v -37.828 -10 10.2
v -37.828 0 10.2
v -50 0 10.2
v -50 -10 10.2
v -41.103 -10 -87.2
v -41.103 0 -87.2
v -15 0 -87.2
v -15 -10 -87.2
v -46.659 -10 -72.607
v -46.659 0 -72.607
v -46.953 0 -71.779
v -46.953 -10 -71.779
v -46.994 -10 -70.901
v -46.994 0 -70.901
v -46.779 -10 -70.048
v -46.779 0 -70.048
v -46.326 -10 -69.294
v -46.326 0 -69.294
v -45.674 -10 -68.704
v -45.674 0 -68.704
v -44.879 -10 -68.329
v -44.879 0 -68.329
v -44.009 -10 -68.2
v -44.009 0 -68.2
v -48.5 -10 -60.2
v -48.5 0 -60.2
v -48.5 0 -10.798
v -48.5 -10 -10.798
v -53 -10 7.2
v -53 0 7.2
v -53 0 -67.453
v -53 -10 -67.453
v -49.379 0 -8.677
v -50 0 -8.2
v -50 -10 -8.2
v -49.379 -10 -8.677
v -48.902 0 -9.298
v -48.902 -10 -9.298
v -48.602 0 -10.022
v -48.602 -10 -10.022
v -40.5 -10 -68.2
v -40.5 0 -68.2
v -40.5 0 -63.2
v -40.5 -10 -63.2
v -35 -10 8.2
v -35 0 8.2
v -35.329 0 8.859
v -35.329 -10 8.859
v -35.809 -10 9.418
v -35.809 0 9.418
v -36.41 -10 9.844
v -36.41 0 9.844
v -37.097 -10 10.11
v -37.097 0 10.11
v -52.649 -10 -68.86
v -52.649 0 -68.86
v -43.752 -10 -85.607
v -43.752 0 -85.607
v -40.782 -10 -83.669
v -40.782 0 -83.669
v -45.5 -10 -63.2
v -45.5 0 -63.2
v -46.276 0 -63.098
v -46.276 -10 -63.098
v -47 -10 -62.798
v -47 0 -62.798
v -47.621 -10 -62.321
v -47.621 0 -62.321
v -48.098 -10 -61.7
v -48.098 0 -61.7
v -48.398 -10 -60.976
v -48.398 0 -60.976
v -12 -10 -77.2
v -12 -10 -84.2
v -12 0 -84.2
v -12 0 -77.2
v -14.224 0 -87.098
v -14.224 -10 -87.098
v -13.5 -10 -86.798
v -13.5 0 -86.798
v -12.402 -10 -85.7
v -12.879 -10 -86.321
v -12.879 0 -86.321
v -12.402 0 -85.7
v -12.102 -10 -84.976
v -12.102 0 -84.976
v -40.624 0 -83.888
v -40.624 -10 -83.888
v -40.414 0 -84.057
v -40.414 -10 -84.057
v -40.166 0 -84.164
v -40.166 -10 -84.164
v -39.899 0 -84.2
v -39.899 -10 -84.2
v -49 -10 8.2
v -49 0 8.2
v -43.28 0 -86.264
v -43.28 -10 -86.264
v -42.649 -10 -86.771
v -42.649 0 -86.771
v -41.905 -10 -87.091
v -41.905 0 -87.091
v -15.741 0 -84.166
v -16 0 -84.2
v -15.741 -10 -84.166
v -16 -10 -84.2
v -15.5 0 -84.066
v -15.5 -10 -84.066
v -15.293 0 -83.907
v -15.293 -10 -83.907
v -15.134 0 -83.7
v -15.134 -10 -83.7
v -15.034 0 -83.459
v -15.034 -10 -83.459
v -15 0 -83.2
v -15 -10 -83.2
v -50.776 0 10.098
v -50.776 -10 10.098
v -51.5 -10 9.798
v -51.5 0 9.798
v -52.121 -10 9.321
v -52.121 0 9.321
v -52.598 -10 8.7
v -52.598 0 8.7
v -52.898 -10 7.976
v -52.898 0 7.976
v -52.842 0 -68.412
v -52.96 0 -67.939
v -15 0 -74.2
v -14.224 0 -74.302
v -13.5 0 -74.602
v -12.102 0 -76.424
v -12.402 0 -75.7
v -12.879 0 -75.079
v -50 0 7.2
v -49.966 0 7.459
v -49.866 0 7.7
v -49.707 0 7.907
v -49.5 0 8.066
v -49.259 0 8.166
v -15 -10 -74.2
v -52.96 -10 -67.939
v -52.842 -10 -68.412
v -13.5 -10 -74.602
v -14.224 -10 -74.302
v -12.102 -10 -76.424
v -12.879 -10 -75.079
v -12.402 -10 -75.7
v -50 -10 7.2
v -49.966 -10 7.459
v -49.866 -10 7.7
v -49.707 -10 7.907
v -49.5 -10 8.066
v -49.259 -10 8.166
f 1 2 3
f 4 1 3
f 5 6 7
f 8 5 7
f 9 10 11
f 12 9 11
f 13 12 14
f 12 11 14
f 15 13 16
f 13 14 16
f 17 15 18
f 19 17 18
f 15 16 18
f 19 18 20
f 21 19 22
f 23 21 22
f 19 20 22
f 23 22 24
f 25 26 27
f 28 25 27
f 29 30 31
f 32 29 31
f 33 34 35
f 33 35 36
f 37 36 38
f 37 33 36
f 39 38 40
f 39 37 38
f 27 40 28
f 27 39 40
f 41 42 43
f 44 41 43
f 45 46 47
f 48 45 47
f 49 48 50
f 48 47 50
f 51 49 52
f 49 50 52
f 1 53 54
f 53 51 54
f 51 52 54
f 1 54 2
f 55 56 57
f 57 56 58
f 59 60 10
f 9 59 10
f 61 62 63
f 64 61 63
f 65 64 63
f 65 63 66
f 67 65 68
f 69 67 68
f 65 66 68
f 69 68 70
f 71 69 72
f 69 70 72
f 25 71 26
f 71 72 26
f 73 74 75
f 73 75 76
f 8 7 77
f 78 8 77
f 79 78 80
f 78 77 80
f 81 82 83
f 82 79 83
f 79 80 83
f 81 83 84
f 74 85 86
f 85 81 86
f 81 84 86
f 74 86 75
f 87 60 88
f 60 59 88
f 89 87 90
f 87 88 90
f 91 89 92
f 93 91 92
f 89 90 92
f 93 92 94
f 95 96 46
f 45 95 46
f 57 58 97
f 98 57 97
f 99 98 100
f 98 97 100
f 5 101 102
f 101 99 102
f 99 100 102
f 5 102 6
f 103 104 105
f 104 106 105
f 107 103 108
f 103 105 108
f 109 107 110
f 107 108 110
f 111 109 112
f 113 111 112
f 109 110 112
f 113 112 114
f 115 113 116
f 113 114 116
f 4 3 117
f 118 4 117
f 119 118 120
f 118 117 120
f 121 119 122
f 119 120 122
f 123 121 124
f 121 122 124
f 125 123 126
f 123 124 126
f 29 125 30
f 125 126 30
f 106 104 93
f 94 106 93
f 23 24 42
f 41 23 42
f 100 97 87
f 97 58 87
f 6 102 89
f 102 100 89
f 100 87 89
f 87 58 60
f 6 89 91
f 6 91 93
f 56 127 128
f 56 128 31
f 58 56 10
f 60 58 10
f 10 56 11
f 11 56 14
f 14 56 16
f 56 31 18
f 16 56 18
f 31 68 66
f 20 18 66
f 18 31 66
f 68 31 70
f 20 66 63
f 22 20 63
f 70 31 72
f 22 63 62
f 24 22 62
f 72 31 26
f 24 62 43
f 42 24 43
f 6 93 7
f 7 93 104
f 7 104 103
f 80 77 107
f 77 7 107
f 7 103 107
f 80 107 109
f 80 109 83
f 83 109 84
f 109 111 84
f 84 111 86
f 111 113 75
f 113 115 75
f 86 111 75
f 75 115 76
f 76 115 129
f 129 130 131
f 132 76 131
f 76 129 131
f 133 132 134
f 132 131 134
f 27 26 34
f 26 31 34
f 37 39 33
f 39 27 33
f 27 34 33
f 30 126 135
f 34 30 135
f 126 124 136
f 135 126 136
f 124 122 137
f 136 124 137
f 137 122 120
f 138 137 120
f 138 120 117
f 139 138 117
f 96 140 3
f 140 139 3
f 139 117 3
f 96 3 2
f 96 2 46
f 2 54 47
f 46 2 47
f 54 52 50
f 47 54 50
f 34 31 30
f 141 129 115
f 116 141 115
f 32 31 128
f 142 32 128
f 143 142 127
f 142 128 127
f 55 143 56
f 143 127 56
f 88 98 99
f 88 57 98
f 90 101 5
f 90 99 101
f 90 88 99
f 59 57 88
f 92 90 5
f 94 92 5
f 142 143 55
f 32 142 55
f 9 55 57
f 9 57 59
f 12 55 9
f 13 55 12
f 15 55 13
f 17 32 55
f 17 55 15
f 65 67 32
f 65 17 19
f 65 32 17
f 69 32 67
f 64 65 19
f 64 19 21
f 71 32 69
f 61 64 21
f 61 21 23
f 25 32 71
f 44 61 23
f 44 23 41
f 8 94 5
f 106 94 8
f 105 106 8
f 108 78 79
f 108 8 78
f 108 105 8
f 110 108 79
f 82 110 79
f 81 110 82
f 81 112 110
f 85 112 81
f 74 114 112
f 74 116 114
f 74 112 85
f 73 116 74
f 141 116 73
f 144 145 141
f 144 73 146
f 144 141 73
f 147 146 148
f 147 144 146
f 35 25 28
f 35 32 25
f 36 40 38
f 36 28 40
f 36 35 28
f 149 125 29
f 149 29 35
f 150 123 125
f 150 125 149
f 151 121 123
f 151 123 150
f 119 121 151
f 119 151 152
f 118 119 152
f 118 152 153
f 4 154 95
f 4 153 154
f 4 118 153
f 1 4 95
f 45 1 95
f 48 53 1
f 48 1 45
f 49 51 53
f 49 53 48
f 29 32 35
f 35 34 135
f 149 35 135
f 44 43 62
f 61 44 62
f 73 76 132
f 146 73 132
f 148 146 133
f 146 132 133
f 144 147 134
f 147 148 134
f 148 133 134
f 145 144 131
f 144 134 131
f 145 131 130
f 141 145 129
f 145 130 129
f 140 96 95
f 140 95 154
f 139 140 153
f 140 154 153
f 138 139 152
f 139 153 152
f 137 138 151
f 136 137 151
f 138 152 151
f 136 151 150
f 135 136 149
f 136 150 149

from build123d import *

# Parameters (mm, degrees)
F1_DEPTH    = 10
F2_T1_DEPTH = 25
F2_T3_DEPTH = 24.1421356237
F2_T5_DEPTH = 19.0165664987
F2_T7_DEPTH = 13.7370663506
F3_R        = 1
F4_T1_DEPTH = 10
F4_T3_DEPTH = 10
F4_T5_DEPTH = 22.9903810568


# Not quite as in the source:
# - a fillet or chamfer that OpenCascade refuses, or shapes differently, is made with other operations: its cross-section is extruded or revolved along the edge and cut away or added
# - a feature names something its author has since deleted; it is built from what else it names


with BuildPart() as f1:
    # F0 (on Front) → F1 (new body)
    with BuildSketch(Plane.XZ):
        Polygon((-50, 8.2), (-35, 8.2), (-35, 10.2), (-53, 10.2), (-53, -68.2), (-49, -68.2), (-49, -63.2), (-48.5, -63.2), (-48.5, -8.2), (-50, -8.2), align=None)
        Polygon((-49, -68.2), (-53, -68.2), (-44.5, -84.2), (-40.5, -84.2), align=None)
        Polygon((-12, -74.2), (-15, -74.2), (-15, -84.2), (-40.5, -84.2), (-44.5, -84.2), (-42.90625, -87.2), (-12, -87.2), align=None)
        Polygon((-40.5, -68.2), (-40.5, -63.2), (-48.5, -63.2), (-49, -63.2), (-49, -68.2), align=None)
    extrude(amount=F1_DEPTH)

    # F2: fillet of radius 3 on 6 edges, made by hand

    # F2_s2 → F2_t1 (cut)
    with BuildSketch(Plane.XZ.offset(-7.5)):
        with BuildLine():
            ThreePointArc((-50, 10.2), (-52.1213203436, 9.3213203436), (-53, 7.2))
            Line((-53, 7.2), (-53, 10.2))
            Line((-53, 10.2), (-50, 10.2))
        make_face()
        with BuildLine():
            ThreePointArc((-12, -77.2), (-12.8786796564, -75.0786796564), (-15, -74.2))
            Line((-15, -74.2), (-12, -74.2))
            Line((-12, -74.2), (-12, -77.2))
        make_face()
        with BuildLine():
            ThreePointArc((-15, -87.2), (-12.8786796564, -86.3213203436), (-12, -84.2))
            Line((-12, -84.2), (-12, -87.2))
            Line((-12, -87.2), (-15, -87.2))
        make_face()
    extrude(amount=F2_T1_DEPTH, mode=Mode.SUBTRACT)

    # F2_s4 → F2_t3 (cut)
    with BuildSketch(Plane.XZ.offset(-7.0710678119)):
        with BuildLine():
            ThreePointArc((-35, 8.2), (-36.0963763172, 9.6494897428), (-37.8284271247, 10.2))
            Line((-37.8284271247, 10.2), (-35, 10.2))
            Line((-35, 10.2), (-35, 8.2))
        make_face()
    extrude(amount=F2_T3_DEPTH, mode=Mode.SUBTRACT)

    # F2_s6 → F2_t5 (cut)
    with BuildSketch(Plane.XZ.offset(-4.5082832494)):
        with BuildLine():
            ThreePointArc((-43.7522838586, -85.6074656779), (-42.648511507, -86.7712251004), (-41.1029367003, -87.2))
            Line((-41.1029367003, -87.2), (-42.90625, -87.2))
            Line((-42.90625, -87.2), (-43.7522838586, -85.6074656779))
        make_face()
    extrude(amount=F2_T5_DEPTH, mode=Mode.SUBTRACT)

    # F2_s8 → F2_t7 (cut)
    with BuildSketch(Plane.XZ.offset(-1.8685331753)):
        with BuildLine():
            ThreePointArc((-53, -67.4525867299), (-52.9110171311, -68.1778310077), (-52.6493471584, -68.8600524078))
            Line((-52.6493471584, -68.8600524078), (-53, -68.2))
            Line((-53, -68.2), (-53, -67.4525867299))
        make_face()
    extrude(amount=F2_T7_DEPTH, mode=Mode.SUBTRACT)

    # F3
    f3_edges = [f1.edges().sort_by_distance(p)[0] for p in [
        (-40.5, -5, -84.2),
        (-15, -5, -84.2),
        (-50, -5, 8.2),
    ]]
    fillet(f3_edges, radius=F3_R)

    # F4: fillet of radius 3 on 3 edges, made by hand

    # F4_s2 → F4_t1 (join)
    with BuildSketch(Plane.XZ):
        with BuildLine():
            ThreePointArc((-46.6585338586, -72.6074656779), (-46.5804118006, -69.6544251933), (-44.0091867003, -68.2))
            Line((-44.0091867003, -68.2), (-49, -68.2))
            Line((-49, -68.2), (-46.6585338586, -72.6074656779))
        make_face()
    extrude(amount=F4_T1_DEPTH)

    # F4_s4 → F4_t3 (join)
    with BuildSketch(Plane.XZ):
        with BuildLine():
            ThreePointArc((-45.5, -63.2), (-47.6213203436, -62.3213203436), (-48.5, -60.2))
            Line((-48.5, -60.2), (-48.5, -63.2))
            Line((-48.5, -63.2), (-45.5, -63.2))
        make_face()
    extrude(amount=F4_T3_DEPTH)

    # F4_s6 → F4_t5 (cut)
    with BuildSketch(Plane.XZ.offset(-6.4951905284)):
        with BuildLine():
            ThreePointArc((-50, -8.2), (-48.9019237886, -9.2980762114), (-48.5, -10.7980762114))
            Line((-48.5, -10.7980762114), (-48.5, -8.2))
            Line((-48.5, -8.2), (-50, -8.2))
        make_face()
    extrude(amount=F4_T5_DEPTH, mode=Mode.SUBTRACT)


solid = f1.part
